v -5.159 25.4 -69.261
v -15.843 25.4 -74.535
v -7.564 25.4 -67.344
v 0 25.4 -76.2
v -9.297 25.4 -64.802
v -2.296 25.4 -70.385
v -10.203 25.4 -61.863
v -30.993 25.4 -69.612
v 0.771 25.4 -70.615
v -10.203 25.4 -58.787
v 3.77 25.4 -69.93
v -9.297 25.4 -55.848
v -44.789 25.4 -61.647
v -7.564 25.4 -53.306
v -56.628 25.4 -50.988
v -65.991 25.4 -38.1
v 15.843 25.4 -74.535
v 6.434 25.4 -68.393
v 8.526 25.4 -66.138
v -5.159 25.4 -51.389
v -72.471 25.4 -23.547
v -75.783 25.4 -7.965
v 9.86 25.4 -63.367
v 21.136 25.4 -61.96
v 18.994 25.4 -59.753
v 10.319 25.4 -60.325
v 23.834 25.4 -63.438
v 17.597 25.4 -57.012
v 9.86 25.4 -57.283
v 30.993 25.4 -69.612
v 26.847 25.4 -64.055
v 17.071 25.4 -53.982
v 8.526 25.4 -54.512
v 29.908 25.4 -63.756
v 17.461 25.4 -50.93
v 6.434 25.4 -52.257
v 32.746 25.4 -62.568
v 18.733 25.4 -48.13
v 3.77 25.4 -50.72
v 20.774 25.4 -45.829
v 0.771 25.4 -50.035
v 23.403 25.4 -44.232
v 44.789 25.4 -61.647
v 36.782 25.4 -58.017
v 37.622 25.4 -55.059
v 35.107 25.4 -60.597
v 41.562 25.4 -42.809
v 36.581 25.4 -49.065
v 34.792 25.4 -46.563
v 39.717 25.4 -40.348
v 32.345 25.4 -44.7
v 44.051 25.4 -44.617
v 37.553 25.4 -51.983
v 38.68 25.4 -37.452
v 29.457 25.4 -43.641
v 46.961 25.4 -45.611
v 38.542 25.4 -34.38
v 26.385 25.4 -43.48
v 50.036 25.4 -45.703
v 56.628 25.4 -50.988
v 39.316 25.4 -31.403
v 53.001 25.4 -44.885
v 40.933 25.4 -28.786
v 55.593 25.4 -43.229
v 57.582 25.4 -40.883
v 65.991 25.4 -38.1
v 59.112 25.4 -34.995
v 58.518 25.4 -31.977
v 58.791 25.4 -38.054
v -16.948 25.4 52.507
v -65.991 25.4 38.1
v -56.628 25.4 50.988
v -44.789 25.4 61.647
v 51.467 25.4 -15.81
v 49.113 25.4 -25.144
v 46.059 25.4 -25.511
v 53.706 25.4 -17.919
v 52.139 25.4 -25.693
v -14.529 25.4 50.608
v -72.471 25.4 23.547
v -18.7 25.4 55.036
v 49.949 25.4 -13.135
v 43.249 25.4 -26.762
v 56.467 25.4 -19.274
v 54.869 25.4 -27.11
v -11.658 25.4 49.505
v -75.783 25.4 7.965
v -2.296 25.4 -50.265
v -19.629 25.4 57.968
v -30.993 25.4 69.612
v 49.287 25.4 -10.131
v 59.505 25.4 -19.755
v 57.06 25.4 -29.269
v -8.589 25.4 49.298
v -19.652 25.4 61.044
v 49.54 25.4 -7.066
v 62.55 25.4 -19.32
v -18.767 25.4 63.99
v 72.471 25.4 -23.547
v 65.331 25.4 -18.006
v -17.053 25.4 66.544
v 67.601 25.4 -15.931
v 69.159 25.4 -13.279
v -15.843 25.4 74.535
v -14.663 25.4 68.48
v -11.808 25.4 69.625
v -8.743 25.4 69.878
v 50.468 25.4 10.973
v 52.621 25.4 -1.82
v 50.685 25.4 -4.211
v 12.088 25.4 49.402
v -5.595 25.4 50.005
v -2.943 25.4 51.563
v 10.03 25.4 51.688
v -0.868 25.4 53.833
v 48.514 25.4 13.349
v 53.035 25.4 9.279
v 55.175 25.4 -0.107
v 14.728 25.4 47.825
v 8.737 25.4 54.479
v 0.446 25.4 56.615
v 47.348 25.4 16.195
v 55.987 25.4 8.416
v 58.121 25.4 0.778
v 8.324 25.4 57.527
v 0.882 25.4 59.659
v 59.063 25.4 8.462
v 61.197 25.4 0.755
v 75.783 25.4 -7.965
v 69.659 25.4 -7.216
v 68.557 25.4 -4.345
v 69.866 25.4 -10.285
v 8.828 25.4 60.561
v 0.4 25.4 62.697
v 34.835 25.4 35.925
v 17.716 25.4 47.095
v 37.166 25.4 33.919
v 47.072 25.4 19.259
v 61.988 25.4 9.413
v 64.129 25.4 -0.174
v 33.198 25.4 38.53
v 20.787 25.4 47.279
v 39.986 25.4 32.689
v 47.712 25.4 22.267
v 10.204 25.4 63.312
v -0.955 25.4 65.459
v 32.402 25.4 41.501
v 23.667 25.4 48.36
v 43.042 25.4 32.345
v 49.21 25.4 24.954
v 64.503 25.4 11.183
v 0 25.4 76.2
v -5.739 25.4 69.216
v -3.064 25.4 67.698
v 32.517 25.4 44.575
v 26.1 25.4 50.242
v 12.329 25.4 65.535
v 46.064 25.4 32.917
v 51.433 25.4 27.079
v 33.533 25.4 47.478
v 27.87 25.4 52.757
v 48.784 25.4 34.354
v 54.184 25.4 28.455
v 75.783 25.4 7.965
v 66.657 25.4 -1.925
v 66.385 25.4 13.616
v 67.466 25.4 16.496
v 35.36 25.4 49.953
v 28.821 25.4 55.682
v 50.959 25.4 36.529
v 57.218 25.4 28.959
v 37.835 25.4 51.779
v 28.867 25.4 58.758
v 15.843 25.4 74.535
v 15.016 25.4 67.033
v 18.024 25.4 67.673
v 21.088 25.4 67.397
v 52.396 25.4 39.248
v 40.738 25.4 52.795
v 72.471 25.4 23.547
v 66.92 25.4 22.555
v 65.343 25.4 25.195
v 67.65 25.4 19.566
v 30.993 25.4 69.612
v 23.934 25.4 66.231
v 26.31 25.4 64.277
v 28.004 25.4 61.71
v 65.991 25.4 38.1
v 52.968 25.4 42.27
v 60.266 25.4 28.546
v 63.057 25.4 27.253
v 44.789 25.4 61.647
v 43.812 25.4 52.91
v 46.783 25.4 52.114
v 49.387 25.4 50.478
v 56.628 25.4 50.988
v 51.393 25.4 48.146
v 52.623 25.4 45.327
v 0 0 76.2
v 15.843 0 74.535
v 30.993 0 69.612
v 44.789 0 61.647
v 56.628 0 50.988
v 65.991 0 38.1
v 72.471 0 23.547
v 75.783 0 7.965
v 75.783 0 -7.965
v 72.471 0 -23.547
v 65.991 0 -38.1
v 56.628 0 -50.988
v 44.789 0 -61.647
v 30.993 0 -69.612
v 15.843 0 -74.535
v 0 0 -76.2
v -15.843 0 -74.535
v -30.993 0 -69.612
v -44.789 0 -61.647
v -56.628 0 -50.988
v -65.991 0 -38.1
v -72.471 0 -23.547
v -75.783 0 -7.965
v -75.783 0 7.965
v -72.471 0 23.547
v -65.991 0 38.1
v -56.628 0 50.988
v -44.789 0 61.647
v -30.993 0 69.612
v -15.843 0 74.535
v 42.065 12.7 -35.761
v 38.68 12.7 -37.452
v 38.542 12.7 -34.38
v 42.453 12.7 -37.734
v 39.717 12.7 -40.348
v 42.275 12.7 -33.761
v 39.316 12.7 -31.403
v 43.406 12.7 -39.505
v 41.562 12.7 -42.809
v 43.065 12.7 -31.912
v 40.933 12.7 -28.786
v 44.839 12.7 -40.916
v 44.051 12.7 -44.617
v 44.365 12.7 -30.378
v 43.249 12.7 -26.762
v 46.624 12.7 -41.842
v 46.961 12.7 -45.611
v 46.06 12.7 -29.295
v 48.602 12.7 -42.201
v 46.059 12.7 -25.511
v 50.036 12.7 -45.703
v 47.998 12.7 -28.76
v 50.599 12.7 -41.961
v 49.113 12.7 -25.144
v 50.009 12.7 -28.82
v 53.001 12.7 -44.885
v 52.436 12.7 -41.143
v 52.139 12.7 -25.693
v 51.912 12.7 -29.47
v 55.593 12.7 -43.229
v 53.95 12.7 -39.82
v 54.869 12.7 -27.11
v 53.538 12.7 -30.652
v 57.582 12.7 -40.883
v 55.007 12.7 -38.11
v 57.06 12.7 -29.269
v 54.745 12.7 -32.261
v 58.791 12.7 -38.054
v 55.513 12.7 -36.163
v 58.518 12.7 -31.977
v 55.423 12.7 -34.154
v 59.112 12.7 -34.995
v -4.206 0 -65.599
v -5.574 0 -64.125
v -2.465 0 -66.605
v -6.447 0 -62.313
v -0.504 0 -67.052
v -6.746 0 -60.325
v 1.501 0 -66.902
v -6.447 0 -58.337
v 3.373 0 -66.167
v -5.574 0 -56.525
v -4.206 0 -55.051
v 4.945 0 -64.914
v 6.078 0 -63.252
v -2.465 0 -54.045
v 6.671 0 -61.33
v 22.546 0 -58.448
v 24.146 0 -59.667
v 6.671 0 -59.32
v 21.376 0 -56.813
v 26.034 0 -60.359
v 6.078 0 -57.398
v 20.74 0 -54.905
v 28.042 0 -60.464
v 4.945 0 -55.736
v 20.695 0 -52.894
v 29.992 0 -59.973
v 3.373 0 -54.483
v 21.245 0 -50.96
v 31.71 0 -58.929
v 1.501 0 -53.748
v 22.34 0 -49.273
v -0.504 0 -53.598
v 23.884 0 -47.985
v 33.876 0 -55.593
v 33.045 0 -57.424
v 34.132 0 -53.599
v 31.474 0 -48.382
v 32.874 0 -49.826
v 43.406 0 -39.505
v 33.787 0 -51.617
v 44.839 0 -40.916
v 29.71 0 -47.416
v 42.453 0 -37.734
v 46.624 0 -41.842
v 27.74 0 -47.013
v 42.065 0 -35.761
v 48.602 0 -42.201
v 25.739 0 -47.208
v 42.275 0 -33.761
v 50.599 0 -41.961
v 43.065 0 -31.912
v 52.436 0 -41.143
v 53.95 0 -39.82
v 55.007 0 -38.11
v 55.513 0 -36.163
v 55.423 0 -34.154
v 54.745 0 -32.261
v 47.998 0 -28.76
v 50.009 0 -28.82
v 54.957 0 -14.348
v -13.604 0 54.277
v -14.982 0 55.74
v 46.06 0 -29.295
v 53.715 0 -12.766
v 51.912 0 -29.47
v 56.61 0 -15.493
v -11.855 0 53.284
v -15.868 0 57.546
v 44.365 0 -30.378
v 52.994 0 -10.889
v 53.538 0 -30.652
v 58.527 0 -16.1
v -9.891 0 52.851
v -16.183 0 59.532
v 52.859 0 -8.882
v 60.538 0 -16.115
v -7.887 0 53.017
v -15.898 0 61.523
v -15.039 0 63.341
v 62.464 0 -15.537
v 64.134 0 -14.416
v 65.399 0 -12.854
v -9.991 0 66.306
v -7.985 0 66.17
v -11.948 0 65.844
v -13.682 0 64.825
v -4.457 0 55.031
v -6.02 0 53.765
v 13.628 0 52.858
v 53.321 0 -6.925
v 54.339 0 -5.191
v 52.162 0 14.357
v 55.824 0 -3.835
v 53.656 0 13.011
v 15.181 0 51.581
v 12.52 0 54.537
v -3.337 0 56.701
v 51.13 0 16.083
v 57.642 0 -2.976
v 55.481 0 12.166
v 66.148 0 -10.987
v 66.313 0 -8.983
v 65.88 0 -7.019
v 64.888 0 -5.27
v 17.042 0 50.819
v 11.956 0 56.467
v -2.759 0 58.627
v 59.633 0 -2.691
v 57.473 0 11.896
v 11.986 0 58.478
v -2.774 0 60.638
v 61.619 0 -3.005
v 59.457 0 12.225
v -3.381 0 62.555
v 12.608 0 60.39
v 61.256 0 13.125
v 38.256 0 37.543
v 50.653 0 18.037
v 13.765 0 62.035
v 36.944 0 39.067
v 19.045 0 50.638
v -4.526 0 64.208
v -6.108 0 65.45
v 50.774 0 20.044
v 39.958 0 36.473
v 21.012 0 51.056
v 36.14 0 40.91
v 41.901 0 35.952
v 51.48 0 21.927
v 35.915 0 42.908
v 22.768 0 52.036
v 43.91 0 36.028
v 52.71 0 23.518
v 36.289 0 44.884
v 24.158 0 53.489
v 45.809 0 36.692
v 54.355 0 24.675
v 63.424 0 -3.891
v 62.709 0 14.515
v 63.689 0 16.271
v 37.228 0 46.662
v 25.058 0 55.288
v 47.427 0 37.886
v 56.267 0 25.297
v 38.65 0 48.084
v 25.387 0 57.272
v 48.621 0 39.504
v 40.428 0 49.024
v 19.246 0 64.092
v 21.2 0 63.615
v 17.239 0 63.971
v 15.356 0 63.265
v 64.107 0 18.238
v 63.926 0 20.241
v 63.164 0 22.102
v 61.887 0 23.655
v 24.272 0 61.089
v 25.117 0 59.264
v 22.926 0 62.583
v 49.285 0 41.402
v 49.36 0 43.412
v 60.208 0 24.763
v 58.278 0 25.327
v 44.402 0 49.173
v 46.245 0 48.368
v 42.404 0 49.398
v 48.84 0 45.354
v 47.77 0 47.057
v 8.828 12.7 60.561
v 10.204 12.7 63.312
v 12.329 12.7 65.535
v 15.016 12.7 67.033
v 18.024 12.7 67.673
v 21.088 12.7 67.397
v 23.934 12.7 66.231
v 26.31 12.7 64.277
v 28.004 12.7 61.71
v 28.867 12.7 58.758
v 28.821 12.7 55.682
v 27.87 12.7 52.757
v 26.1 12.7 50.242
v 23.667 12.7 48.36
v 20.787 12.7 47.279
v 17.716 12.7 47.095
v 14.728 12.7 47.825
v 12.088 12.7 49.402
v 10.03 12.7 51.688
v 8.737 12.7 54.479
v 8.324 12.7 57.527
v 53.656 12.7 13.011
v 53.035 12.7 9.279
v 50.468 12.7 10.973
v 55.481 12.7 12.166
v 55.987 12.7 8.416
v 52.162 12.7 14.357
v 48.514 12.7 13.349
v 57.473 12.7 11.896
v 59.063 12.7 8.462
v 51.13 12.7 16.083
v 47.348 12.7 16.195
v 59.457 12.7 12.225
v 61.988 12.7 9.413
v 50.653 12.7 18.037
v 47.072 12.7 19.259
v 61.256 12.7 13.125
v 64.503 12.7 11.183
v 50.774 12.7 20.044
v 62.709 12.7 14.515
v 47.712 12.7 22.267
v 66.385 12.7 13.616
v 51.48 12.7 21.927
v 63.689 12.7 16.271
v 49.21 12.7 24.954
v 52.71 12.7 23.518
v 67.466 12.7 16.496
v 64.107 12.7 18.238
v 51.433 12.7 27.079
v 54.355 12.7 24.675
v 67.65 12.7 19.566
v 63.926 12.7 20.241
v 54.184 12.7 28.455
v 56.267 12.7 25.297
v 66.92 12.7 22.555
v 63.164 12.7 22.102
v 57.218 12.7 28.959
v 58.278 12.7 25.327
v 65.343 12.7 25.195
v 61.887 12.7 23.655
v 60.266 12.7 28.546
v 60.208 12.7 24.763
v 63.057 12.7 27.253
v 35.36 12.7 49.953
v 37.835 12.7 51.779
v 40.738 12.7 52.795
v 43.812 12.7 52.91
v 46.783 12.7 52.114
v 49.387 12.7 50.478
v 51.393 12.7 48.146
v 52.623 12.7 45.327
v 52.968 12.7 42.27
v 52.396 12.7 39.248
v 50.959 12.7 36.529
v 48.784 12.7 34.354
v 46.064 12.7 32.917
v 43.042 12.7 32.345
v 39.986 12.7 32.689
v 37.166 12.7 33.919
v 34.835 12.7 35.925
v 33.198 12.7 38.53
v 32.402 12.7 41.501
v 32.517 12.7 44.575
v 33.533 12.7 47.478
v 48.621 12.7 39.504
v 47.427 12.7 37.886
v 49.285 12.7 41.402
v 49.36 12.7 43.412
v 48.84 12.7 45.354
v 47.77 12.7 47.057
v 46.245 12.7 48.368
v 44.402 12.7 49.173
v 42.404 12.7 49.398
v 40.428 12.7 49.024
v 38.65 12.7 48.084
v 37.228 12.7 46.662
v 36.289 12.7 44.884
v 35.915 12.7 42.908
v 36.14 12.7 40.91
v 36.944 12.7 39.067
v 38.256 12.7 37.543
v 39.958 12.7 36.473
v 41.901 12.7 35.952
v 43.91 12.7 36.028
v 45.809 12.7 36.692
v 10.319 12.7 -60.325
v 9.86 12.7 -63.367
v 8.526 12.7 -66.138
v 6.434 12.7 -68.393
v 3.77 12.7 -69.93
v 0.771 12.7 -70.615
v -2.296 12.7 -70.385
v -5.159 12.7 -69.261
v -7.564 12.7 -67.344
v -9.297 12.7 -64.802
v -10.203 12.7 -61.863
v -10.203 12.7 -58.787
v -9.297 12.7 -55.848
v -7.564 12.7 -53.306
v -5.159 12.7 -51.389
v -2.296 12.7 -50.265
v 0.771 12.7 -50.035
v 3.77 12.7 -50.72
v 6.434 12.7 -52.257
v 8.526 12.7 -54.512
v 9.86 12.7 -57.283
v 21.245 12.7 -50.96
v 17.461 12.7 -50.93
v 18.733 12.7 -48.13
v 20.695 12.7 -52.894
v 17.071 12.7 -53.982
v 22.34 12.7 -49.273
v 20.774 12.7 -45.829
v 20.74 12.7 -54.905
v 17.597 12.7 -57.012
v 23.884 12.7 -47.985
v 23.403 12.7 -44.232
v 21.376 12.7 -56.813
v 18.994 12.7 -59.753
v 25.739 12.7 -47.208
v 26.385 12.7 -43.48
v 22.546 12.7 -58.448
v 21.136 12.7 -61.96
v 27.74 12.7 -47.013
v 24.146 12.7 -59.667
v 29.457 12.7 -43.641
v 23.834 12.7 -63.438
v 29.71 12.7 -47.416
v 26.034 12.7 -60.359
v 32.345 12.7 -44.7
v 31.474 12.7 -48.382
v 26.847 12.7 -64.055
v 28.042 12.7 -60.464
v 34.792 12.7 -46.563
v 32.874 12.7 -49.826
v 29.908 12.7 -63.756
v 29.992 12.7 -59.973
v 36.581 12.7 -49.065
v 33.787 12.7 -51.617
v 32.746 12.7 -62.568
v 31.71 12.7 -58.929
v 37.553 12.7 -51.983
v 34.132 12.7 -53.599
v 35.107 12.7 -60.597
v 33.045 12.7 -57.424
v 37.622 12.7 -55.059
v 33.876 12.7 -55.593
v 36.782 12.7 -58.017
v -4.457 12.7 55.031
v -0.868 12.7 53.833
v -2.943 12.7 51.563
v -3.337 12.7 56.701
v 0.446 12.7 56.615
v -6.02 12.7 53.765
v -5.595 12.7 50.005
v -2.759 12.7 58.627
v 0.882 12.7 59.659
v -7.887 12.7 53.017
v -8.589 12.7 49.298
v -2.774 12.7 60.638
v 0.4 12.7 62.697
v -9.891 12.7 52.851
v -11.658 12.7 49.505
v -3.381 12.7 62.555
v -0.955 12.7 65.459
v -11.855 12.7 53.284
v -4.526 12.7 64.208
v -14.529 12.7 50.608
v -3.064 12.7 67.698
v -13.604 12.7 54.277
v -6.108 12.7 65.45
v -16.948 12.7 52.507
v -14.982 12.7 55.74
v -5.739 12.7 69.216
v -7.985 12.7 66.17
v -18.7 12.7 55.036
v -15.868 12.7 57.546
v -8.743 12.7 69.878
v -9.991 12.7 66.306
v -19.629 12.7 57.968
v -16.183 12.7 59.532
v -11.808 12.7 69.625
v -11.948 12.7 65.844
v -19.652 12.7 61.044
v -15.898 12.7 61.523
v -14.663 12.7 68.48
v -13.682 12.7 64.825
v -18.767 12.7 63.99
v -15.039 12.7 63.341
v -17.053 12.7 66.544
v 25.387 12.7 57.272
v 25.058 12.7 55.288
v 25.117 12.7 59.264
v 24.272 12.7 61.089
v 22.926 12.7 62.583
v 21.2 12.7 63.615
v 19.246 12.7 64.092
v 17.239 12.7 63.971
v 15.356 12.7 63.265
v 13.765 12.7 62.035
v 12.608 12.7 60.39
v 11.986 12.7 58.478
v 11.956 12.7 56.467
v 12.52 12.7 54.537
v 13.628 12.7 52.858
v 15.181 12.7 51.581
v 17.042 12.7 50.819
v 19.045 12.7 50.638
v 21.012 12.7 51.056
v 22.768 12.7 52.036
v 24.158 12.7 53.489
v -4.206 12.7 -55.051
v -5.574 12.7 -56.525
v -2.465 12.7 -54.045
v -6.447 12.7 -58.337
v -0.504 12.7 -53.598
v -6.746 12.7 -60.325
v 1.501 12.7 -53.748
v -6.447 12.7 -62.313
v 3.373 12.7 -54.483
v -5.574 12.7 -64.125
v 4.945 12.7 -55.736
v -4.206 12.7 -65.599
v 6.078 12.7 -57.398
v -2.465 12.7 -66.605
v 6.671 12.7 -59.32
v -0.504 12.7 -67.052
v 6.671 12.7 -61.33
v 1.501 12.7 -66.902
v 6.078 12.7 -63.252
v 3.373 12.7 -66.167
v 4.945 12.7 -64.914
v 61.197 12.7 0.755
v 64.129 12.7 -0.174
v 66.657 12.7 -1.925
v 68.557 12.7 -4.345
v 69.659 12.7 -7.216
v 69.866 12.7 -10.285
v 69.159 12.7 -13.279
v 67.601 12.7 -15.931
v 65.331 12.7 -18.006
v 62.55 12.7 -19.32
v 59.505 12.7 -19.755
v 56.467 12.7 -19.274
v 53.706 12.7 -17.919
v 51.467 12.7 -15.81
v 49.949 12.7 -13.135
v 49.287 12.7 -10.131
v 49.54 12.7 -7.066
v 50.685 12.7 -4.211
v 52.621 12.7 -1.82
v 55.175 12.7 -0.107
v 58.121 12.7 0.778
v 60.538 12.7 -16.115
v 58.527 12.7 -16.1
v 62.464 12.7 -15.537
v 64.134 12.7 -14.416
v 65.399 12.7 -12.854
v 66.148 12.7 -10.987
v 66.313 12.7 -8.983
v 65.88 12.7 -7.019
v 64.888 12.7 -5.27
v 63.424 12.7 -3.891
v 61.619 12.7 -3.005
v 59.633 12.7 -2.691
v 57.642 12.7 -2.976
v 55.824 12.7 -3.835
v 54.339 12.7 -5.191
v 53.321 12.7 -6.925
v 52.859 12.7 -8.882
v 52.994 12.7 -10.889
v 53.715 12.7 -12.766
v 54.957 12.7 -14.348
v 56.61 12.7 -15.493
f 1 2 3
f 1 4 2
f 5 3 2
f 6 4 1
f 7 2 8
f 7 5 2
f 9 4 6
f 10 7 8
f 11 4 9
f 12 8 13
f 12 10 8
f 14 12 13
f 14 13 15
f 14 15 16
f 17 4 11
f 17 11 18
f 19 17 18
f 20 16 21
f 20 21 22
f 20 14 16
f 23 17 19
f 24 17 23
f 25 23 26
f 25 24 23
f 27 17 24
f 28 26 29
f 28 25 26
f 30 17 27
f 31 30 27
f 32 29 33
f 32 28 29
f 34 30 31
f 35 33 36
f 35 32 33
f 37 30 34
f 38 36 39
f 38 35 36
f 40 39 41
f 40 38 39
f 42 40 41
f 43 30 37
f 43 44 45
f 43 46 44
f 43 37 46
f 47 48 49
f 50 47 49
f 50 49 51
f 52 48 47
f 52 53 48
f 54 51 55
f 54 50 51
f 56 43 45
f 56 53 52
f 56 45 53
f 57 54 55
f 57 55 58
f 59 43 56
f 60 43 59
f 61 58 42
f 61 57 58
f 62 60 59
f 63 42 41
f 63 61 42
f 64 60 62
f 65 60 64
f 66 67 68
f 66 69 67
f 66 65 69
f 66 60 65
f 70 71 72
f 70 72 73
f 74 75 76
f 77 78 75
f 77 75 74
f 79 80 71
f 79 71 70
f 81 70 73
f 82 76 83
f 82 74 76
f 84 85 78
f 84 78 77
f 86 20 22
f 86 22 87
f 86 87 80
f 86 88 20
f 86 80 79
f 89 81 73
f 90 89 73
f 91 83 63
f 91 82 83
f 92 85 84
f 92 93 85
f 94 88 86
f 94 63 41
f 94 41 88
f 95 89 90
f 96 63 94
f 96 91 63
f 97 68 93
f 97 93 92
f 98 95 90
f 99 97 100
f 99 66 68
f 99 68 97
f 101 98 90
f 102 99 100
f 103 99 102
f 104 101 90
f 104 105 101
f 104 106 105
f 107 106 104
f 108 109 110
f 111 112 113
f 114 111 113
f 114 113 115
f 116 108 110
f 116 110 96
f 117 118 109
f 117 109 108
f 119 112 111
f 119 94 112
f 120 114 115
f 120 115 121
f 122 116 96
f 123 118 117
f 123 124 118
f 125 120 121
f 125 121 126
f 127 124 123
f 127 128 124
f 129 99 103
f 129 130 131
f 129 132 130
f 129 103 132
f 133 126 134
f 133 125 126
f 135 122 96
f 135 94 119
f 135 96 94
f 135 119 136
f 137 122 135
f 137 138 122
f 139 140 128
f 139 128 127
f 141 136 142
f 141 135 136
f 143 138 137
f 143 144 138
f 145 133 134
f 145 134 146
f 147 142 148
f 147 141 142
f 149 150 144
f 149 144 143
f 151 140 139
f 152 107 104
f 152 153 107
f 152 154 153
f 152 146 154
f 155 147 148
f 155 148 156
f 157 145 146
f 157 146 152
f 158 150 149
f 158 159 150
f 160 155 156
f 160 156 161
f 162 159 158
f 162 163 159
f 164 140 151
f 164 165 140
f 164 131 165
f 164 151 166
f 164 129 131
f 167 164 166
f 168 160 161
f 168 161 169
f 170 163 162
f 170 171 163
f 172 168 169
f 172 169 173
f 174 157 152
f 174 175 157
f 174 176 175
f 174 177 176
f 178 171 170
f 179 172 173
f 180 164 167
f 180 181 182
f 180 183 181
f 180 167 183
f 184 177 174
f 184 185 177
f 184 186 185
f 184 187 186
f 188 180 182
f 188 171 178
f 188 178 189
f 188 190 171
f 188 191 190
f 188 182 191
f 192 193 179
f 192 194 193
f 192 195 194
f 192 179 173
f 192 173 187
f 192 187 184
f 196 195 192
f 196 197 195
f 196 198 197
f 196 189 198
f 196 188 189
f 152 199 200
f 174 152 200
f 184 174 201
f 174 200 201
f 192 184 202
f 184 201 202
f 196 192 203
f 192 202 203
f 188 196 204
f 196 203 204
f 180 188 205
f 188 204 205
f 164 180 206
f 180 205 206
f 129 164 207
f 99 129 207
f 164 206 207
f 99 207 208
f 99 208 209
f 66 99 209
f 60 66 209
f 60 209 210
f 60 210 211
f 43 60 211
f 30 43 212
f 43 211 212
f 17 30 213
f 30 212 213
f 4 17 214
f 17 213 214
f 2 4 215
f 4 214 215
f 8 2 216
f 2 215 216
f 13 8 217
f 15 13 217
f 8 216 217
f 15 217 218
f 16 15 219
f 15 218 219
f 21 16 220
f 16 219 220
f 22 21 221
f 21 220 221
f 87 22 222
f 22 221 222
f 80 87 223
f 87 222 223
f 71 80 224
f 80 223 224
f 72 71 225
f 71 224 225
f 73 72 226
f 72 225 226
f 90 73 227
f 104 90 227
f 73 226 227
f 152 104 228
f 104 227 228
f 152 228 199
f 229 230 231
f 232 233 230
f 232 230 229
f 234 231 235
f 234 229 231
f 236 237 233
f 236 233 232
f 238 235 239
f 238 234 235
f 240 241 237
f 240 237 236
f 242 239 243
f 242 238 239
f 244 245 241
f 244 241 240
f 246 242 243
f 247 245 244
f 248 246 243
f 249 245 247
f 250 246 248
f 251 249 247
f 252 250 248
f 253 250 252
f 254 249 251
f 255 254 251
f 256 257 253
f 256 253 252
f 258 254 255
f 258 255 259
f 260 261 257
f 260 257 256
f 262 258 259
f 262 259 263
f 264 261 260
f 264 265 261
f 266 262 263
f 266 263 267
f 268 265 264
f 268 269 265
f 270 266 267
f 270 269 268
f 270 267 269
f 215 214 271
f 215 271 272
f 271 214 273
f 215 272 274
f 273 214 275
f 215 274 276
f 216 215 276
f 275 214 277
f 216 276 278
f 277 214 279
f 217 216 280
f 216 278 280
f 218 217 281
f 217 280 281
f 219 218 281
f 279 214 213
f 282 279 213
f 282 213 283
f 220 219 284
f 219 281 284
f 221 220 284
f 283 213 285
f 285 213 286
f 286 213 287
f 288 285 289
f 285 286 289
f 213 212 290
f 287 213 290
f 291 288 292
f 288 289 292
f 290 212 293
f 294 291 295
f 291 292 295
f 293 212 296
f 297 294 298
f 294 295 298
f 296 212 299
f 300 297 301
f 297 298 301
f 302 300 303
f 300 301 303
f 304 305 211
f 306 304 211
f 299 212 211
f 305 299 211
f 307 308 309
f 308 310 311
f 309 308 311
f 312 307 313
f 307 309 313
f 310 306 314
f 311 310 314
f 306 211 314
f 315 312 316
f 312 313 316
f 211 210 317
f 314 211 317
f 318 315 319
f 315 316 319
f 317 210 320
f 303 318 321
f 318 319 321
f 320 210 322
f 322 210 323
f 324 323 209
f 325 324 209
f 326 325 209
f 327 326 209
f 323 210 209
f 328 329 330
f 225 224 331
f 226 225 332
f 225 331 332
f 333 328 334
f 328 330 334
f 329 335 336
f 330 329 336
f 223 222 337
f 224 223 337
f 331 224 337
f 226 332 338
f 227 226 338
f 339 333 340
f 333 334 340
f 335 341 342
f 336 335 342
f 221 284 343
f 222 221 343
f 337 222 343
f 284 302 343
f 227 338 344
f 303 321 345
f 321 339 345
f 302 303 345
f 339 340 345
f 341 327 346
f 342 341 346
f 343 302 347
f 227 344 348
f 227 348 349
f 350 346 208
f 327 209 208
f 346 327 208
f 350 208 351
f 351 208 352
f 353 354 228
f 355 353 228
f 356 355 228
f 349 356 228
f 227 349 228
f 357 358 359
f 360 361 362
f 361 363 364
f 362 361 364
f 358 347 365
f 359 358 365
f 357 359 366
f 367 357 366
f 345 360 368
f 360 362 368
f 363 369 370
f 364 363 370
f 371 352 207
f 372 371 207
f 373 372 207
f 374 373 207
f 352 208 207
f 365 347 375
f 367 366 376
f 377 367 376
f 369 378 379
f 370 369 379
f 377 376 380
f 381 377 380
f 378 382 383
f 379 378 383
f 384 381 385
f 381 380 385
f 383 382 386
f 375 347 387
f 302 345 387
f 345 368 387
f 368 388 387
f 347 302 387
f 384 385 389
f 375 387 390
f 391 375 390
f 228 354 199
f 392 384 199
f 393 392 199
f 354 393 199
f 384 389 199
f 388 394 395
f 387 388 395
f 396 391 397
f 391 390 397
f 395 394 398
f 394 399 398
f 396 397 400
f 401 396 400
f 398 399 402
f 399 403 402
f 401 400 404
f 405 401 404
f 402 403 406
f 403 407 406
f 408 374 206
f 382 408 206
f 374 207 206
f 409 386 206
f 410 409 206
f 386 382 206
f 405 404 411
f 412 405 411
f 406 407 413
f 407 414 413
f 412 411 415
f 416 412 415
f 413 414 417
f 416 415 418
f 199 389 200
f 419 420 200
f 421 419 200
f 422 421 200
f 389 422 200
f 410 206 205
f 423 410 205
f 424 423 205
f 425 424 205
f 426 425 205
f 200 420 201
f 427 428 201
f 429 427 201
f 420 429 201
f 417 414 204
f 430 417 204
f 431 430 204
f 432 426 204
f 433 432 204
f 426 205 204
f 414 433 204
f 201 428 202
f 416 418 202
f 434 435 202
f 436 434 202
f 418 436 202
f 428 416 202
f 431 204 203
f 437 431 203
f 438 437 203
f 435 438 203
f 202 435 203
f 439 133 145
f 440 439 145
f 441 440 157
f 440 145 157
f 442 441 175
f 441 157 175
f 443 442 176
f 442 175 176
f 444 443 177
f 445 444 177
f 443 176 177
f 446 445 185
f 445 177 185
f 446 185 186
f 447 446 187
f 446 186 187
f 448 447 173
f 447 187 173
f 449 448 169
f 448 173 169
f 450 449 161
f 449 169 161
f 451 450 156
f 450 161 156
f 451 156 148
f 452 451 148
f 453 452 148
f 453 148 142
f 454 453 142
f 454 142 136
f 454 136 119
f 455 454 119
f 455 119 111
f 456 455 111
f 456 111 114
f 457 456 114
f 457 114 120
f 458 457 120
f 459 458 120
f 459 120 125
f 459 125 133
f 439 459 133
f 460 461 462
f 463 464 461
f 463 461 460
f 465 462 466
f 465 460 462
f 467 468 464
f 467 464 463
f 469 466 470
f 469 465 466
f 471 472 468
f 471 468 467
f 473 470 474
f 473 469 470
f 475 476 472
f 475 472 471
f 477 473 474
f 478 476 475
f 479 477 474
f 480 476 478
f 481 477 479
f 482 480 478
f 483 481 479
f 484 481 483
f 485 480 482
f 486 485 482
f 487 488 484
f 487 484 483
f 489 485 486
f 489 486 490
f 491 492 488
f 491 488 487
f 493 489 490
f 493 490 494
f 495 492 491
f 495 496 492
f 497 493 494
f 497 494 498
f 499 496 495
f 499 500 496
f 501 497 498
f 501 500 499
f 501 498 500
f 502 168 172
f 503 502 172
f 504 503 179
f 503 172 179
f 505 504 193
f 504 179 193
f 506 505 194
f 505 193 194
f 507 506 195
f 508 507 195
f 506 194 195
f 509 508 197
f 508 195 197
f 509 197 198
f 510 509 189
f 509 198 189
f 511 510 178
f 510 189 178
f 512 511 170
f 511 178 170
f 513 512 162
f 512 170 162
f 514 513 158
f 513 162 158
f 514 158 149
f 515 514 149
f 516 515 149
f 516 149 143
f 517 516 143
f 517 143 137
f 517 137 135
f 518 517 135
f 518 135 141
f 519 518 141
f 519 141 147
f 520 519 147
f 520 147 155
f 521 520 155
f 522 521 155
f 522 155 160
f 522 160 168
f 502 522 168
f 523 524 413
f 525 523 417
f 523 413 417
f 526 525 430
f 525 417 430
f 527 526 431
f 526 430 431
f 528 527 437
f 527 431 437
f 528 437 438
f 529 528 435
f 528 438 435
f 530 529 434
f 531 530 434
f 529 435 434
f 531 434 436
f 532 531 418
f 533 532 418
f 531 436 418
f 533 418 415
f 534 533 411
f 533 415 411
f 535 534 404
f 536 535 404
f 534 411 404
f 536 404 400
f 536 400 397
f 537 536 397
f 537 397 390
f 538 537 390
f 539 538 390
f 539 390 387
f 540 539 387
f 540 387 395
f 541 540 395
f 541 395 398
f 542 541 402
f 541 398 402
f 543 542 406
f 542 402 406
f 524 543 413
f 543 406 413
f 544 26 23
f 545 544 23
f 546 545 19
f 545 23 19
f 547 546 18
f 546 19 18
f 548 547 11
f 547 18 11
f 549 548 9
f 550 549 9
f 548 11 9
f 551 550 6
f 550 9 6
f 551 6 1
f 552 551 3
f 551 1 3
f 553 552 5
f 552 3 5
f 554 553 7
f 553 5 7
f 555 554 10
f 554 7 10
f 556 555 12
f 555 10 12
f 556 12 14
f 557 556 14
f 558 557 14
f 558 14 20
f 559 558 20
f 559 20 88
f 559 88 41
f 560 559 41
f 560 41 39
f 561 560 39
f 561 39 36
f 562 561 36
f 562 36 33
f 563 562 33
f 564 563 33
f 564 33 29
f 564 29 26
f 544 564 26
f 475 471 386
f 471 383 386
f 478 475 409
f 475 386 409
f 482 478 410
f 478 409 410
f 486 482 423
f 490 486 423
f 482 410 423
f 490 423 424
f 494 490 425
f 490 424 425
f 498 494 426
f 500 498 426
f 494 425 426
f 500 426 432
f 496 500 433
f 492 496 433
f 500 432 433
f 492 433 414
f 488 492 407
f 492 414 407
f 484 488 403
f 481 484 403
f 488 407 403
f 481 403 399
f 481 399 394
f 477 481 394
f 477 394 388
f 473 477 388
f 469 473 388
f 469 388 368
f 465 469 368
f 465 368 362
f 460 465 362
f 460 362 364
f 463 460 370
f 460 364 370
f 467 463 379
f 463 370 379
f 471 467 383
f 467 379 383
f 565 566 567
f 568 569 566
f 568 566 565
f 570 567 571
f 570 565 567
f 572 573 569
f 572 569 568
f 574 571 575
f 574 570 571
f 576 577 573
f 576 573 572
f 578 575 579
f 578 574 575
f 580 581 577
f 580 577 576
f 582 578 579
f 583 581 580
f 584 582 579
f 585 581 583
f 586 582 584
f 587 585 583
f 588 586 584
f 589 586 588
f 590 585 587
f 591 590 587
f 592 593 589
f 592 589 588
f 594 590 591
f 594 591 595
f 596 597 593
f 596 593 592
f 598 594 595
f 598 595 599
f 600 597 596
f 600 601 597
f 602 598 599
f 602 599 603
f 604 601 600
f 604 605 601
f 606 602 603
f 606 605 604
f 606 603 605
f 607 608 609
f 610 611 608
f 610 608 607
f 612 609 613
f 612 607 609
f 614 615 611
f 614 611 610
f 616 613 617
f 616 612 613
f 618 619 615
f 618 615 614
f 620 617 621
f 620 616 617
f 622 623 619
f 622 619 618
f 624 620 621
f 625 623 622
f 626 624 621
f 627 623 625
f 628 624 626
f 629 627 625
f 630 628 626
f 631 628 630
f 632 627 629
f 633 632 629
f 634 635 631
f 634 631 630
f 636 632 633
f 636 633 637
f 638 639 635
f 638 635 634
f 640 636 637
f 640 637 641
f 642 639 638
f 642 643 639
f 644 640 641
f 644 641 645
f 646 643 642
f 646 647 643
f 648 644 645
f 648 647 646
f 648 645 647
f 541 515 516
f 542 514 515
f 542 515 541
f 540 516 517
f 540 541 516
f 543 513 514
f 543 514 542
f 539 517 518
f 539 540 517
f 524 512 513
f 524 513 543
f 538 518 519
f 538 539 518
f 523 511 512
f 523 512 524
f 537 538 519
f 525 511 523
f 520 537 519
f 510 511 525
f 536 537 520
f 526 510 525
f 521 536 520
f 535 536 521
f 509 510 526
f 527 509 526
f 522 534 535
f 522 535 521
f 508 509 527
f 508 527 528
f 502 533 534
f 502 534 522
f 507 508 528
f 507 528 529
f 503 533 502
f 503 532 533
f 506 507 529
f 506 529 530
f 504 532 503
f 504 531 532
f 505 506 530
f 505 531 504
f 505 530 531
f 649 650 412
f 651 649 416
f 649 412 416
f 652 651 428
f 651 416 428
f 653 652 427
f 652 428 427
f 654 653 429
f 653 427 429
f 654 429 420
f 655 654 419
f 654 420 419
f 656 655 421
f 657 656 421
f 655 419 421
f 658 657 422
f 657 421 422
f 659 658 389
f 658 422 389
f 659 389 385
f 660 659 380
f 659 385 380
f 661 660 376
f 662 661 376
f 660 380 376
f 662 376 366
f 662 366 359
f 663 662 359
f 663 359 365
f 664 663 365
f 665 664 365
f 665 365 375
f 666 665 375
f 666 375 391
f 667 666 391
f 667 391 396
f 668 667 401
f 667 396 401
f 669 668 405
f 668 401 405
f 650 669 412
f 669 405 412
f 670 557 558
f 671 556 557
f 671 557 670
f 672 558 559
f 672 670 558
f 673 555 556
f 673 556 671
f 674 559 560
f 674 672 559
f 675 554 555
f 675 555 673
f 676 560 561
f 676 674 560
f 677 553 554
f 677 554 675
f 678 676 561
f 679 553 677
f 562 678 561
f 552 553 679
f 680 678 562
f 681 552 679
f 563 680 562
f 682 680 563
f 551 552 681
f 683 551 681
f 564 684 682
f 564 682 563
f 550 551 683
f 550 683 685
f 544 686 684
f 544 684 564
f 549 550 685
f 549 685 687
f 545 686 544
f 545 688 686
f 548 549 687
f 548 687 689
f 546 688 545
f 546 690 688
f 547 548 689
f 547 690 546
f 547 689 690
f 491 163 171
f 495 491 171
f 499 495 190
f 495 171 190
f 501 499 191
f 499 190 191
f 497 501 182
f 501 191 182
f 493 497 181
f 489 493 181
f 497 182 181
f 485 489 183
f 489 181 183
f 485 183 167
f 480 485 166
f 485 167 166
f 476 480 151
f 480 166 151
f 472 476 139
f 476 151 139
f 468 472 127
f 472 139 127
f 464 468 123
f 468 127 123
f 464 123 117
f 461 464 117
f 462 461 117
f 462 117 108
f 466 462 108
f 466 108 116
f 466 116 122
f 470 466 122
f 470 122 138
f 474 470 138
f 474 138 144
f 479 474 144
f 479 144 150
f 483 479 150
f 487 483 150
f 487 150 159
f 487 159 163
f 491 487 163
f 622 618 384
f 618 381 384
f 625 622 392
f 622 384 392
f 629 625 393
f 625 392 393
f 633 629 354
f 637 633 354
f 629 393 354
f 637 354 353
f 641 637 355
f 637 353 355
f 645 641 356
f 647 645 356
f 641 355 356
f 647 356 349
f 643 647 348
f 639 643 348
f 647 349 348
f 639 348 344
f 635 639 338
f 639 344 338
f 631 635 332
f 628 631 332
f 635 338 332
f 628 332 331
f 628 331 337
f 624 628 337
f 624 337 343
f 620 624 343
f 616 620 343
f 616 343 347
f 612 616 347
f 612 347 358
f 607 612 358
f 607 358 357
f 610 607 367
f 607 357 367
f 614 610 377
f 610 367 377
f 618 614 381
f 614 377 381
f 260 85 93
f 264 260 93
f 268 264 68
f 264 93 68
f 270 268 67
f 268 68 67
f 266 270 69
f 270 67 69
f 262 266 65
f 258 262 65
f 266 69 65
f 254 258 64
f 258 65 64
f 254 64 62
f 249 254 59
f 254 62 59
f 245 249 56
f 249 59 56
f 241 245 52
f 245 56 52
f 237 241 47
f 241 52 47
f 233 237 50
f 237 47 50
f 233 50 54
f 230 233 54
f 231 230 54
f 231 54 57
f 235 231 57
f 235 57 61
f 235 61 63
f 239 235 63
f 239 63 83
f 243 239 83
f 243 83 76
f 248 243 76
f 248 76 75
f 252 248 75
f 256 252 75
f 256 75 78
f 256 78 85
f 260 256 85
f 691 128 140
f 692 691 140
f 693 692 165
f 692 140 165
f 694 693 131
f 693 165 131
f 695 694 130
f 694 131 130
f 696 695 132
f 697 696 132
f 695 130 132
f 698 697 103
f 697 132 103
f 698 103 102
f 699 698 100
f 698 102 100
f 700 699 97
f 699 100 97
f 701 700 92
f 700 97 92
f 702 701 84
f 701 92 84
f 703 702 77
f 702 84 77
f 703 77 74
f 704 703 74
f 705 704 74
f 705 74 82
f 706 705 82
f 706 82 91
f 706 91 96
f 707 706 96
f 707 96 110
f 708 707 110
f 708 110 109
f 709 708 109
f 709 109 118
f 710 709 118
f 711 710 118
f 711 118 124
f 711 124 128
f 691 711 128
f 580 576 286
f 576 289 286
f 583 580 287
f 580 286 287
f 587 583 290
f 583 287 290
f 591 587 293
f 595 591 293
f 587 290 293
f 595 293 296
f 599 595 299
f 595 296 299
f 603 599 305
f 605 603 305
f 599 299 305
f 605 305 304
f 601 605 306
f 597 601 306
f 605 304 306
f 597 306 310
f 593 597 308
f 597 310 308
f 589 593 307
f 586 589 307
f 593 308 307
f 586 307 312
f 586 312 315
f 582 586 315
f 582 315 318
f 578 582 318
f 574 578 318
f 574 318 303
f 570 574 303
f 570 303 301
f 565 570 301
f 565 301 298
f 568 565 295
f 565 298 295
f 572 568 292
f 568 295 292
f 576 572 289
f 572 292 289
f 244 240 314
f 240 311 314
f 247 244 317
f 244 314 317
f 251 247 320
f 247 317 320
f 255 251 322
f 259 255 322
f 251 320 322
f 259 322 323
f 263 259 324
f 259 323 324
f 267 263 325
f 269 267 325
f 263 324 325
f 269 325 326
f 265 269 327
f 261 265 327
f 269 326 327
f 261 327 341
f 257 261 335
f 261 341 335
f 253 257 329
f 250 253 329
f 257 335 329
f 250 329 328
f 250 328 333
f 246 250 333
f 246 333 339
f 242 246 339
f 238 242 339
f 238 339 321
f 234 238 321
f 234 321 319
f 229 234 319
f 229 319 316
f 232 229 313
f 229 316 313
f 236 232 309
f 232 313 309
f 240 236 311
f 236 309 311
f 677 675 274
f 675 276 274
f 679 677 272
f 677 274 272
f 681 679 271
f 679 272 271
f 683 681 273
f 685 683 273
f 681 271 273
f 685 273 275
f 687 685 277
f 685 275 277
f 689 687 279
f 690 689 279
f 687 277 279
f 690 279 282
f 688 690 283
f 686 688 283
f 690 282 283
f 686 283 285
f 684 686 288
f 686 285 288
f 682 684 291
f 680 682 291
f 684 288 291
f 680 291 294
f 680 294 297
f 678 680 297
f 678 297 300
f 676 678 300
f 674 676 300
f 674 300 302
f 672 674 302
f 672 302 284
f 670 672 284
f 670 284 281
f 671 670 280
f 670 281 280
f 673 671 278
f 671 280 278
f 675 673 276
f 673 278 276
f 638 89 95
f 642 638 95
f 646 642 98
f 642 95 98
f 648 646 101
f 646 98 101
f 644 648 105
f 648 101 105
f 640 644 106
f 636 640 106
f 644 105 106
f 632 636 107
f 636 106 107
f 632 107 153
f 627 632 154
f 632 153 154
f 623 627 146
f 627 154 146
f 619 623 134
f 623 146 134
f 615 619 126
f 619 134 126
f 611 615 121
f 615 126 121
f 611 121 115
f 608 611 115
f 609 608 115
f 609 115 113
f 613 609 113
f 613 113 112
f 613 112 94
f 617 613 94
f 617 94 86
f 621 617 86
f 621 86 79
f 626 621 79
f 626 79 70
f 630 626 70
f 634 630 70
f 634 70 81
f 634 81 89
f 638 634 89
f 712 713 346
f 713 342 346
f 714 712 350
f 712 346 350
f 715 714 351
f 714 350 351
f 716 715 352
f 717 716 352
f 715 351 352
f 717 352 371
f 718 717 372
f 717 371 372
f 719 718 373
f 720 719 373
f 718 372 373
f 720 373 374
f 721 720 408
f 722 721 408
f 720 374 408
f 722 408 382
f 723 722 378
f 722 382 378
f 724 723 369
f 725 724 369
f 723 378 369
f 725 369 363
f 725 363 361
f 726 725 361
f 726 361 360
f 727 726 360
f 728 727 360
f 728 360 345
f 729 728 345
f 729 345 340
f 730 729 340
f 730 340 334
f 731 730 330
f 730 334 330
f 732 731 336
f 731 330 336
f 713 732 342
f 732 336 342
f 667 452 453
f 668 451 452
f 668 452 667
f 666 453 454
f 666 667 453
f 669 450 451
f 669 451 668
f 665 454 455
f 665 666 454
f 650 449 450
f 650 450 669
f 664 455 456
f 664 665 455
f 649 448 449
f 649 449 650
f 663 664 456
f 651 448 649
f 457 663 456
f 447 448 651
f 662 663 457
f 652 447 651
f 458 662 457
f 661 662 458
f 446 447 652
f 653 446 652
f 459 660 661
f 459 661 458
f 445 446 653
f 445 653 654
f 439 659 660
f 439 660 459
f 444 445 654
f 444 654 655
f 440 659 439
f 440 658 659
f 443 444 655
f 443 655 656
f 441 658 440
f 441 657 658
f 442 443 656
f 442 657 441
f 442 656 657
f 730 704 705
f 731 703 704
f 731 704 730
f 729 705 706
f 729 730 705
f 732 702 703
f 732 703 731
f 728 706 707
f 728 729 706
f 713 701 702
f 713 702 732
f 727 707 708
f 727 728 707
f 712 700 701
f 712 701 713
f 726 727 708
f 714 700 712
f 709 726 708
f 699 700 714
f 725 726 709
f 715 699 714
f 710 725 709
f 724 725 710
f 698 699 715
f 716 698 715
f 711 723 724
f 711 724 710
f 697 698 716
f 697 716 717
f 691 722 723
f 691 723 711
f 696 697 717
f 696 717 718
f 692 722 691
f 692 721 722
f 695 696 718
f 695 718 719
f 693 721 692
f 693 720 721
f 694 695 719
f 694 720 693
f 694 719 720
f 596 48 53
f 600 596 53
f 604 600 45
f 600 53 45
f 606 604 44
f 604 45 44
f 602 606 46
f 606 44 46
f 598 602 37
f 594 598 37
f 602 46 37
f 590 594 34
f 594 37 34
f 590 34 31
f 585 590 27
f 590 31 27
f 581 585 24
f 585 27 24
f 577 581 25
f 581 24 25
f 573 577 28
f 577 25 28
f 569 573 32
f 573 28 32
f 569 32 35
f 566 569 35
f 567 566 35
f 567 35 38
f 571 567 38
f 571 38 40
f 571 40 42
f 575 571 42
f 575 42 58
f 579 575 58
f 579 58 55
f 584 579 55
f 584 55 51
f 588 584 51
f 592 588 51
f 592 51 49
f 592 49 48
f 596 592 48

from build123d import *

# Parameters (mm, degrees)
SKETCH1_R                                        = 76.2
BOSS_EXTRUDE1_DEPTH                              = 25.4
CBORE_FOR_1_2_SOCKET_HEAD_CAP_SCREW1_D           = 13.49248
CBORE_FOR_1_2_SOCKET_HEAD_CAP_SCREW1_CBORE_D     = 20.6375
CBORE_FOR_1_2_SOCKET_HEAD_CAP_SCREW1_CBORE_DEPTH = 12.7
CIRPATTERN1_COUNT                                = 8
CIRPATTERN1_ANGLE                                = 189


with BuildPart() as part:
    # Sketch1 → Boss-Extrude1 (new body)
    with BuildSketch(Plane(origin=(0, 0, 0), x_dir=(1, 0, 0), z_dir=(0, 1, 0))):
        with Locations(Location((0, 0, 0), (0, 0, 270))):
            Circle(SKETCH1_R)
    extrude(amount=BOSS_EXTRUDE1_DEPTH)

    # CBORE for 1/2 Socket Head Cap Screw1 (through all)
    with Locations(Plane(origin=(0, 25.4, 0), x_dir=(1, 0, 0), z_dir=(0, 1, 0))):
        with Locations((0, 60.325)):
            cbore_for_1_2_socket_head_cap_screw1 = CounterBoreHole(CBORE_FOR_1_2_SOCKET_HEAD_CAP_SCREW1_D / 2, CBORE_FOR_1_2_SOCKET_HEAD_CAP_SCREW1_CBORE_D / 2, CBORE_FOR_1_2_SOCKET_HEAD_CAP_SCREW1_CBORE_DEPTH)

    # CirPattern1: CBORE for 1/2 Socket Head Cap Screw1 ×8 about axis
    cirpattern1_axis = Axis((0, 0, 0), (0, -1, 0))
    for i in range(1, CIRPATTERN1_COUNT):
        add(cbore_for_1_2_socket_head_cap_screw1.rotate(cirpattern1_axis, i * CIRPATTERN1_ANGLE / (CIRPATTERN1_COUNT - 1)), mode=Mode.SUBTRACT)


solid = part.part
